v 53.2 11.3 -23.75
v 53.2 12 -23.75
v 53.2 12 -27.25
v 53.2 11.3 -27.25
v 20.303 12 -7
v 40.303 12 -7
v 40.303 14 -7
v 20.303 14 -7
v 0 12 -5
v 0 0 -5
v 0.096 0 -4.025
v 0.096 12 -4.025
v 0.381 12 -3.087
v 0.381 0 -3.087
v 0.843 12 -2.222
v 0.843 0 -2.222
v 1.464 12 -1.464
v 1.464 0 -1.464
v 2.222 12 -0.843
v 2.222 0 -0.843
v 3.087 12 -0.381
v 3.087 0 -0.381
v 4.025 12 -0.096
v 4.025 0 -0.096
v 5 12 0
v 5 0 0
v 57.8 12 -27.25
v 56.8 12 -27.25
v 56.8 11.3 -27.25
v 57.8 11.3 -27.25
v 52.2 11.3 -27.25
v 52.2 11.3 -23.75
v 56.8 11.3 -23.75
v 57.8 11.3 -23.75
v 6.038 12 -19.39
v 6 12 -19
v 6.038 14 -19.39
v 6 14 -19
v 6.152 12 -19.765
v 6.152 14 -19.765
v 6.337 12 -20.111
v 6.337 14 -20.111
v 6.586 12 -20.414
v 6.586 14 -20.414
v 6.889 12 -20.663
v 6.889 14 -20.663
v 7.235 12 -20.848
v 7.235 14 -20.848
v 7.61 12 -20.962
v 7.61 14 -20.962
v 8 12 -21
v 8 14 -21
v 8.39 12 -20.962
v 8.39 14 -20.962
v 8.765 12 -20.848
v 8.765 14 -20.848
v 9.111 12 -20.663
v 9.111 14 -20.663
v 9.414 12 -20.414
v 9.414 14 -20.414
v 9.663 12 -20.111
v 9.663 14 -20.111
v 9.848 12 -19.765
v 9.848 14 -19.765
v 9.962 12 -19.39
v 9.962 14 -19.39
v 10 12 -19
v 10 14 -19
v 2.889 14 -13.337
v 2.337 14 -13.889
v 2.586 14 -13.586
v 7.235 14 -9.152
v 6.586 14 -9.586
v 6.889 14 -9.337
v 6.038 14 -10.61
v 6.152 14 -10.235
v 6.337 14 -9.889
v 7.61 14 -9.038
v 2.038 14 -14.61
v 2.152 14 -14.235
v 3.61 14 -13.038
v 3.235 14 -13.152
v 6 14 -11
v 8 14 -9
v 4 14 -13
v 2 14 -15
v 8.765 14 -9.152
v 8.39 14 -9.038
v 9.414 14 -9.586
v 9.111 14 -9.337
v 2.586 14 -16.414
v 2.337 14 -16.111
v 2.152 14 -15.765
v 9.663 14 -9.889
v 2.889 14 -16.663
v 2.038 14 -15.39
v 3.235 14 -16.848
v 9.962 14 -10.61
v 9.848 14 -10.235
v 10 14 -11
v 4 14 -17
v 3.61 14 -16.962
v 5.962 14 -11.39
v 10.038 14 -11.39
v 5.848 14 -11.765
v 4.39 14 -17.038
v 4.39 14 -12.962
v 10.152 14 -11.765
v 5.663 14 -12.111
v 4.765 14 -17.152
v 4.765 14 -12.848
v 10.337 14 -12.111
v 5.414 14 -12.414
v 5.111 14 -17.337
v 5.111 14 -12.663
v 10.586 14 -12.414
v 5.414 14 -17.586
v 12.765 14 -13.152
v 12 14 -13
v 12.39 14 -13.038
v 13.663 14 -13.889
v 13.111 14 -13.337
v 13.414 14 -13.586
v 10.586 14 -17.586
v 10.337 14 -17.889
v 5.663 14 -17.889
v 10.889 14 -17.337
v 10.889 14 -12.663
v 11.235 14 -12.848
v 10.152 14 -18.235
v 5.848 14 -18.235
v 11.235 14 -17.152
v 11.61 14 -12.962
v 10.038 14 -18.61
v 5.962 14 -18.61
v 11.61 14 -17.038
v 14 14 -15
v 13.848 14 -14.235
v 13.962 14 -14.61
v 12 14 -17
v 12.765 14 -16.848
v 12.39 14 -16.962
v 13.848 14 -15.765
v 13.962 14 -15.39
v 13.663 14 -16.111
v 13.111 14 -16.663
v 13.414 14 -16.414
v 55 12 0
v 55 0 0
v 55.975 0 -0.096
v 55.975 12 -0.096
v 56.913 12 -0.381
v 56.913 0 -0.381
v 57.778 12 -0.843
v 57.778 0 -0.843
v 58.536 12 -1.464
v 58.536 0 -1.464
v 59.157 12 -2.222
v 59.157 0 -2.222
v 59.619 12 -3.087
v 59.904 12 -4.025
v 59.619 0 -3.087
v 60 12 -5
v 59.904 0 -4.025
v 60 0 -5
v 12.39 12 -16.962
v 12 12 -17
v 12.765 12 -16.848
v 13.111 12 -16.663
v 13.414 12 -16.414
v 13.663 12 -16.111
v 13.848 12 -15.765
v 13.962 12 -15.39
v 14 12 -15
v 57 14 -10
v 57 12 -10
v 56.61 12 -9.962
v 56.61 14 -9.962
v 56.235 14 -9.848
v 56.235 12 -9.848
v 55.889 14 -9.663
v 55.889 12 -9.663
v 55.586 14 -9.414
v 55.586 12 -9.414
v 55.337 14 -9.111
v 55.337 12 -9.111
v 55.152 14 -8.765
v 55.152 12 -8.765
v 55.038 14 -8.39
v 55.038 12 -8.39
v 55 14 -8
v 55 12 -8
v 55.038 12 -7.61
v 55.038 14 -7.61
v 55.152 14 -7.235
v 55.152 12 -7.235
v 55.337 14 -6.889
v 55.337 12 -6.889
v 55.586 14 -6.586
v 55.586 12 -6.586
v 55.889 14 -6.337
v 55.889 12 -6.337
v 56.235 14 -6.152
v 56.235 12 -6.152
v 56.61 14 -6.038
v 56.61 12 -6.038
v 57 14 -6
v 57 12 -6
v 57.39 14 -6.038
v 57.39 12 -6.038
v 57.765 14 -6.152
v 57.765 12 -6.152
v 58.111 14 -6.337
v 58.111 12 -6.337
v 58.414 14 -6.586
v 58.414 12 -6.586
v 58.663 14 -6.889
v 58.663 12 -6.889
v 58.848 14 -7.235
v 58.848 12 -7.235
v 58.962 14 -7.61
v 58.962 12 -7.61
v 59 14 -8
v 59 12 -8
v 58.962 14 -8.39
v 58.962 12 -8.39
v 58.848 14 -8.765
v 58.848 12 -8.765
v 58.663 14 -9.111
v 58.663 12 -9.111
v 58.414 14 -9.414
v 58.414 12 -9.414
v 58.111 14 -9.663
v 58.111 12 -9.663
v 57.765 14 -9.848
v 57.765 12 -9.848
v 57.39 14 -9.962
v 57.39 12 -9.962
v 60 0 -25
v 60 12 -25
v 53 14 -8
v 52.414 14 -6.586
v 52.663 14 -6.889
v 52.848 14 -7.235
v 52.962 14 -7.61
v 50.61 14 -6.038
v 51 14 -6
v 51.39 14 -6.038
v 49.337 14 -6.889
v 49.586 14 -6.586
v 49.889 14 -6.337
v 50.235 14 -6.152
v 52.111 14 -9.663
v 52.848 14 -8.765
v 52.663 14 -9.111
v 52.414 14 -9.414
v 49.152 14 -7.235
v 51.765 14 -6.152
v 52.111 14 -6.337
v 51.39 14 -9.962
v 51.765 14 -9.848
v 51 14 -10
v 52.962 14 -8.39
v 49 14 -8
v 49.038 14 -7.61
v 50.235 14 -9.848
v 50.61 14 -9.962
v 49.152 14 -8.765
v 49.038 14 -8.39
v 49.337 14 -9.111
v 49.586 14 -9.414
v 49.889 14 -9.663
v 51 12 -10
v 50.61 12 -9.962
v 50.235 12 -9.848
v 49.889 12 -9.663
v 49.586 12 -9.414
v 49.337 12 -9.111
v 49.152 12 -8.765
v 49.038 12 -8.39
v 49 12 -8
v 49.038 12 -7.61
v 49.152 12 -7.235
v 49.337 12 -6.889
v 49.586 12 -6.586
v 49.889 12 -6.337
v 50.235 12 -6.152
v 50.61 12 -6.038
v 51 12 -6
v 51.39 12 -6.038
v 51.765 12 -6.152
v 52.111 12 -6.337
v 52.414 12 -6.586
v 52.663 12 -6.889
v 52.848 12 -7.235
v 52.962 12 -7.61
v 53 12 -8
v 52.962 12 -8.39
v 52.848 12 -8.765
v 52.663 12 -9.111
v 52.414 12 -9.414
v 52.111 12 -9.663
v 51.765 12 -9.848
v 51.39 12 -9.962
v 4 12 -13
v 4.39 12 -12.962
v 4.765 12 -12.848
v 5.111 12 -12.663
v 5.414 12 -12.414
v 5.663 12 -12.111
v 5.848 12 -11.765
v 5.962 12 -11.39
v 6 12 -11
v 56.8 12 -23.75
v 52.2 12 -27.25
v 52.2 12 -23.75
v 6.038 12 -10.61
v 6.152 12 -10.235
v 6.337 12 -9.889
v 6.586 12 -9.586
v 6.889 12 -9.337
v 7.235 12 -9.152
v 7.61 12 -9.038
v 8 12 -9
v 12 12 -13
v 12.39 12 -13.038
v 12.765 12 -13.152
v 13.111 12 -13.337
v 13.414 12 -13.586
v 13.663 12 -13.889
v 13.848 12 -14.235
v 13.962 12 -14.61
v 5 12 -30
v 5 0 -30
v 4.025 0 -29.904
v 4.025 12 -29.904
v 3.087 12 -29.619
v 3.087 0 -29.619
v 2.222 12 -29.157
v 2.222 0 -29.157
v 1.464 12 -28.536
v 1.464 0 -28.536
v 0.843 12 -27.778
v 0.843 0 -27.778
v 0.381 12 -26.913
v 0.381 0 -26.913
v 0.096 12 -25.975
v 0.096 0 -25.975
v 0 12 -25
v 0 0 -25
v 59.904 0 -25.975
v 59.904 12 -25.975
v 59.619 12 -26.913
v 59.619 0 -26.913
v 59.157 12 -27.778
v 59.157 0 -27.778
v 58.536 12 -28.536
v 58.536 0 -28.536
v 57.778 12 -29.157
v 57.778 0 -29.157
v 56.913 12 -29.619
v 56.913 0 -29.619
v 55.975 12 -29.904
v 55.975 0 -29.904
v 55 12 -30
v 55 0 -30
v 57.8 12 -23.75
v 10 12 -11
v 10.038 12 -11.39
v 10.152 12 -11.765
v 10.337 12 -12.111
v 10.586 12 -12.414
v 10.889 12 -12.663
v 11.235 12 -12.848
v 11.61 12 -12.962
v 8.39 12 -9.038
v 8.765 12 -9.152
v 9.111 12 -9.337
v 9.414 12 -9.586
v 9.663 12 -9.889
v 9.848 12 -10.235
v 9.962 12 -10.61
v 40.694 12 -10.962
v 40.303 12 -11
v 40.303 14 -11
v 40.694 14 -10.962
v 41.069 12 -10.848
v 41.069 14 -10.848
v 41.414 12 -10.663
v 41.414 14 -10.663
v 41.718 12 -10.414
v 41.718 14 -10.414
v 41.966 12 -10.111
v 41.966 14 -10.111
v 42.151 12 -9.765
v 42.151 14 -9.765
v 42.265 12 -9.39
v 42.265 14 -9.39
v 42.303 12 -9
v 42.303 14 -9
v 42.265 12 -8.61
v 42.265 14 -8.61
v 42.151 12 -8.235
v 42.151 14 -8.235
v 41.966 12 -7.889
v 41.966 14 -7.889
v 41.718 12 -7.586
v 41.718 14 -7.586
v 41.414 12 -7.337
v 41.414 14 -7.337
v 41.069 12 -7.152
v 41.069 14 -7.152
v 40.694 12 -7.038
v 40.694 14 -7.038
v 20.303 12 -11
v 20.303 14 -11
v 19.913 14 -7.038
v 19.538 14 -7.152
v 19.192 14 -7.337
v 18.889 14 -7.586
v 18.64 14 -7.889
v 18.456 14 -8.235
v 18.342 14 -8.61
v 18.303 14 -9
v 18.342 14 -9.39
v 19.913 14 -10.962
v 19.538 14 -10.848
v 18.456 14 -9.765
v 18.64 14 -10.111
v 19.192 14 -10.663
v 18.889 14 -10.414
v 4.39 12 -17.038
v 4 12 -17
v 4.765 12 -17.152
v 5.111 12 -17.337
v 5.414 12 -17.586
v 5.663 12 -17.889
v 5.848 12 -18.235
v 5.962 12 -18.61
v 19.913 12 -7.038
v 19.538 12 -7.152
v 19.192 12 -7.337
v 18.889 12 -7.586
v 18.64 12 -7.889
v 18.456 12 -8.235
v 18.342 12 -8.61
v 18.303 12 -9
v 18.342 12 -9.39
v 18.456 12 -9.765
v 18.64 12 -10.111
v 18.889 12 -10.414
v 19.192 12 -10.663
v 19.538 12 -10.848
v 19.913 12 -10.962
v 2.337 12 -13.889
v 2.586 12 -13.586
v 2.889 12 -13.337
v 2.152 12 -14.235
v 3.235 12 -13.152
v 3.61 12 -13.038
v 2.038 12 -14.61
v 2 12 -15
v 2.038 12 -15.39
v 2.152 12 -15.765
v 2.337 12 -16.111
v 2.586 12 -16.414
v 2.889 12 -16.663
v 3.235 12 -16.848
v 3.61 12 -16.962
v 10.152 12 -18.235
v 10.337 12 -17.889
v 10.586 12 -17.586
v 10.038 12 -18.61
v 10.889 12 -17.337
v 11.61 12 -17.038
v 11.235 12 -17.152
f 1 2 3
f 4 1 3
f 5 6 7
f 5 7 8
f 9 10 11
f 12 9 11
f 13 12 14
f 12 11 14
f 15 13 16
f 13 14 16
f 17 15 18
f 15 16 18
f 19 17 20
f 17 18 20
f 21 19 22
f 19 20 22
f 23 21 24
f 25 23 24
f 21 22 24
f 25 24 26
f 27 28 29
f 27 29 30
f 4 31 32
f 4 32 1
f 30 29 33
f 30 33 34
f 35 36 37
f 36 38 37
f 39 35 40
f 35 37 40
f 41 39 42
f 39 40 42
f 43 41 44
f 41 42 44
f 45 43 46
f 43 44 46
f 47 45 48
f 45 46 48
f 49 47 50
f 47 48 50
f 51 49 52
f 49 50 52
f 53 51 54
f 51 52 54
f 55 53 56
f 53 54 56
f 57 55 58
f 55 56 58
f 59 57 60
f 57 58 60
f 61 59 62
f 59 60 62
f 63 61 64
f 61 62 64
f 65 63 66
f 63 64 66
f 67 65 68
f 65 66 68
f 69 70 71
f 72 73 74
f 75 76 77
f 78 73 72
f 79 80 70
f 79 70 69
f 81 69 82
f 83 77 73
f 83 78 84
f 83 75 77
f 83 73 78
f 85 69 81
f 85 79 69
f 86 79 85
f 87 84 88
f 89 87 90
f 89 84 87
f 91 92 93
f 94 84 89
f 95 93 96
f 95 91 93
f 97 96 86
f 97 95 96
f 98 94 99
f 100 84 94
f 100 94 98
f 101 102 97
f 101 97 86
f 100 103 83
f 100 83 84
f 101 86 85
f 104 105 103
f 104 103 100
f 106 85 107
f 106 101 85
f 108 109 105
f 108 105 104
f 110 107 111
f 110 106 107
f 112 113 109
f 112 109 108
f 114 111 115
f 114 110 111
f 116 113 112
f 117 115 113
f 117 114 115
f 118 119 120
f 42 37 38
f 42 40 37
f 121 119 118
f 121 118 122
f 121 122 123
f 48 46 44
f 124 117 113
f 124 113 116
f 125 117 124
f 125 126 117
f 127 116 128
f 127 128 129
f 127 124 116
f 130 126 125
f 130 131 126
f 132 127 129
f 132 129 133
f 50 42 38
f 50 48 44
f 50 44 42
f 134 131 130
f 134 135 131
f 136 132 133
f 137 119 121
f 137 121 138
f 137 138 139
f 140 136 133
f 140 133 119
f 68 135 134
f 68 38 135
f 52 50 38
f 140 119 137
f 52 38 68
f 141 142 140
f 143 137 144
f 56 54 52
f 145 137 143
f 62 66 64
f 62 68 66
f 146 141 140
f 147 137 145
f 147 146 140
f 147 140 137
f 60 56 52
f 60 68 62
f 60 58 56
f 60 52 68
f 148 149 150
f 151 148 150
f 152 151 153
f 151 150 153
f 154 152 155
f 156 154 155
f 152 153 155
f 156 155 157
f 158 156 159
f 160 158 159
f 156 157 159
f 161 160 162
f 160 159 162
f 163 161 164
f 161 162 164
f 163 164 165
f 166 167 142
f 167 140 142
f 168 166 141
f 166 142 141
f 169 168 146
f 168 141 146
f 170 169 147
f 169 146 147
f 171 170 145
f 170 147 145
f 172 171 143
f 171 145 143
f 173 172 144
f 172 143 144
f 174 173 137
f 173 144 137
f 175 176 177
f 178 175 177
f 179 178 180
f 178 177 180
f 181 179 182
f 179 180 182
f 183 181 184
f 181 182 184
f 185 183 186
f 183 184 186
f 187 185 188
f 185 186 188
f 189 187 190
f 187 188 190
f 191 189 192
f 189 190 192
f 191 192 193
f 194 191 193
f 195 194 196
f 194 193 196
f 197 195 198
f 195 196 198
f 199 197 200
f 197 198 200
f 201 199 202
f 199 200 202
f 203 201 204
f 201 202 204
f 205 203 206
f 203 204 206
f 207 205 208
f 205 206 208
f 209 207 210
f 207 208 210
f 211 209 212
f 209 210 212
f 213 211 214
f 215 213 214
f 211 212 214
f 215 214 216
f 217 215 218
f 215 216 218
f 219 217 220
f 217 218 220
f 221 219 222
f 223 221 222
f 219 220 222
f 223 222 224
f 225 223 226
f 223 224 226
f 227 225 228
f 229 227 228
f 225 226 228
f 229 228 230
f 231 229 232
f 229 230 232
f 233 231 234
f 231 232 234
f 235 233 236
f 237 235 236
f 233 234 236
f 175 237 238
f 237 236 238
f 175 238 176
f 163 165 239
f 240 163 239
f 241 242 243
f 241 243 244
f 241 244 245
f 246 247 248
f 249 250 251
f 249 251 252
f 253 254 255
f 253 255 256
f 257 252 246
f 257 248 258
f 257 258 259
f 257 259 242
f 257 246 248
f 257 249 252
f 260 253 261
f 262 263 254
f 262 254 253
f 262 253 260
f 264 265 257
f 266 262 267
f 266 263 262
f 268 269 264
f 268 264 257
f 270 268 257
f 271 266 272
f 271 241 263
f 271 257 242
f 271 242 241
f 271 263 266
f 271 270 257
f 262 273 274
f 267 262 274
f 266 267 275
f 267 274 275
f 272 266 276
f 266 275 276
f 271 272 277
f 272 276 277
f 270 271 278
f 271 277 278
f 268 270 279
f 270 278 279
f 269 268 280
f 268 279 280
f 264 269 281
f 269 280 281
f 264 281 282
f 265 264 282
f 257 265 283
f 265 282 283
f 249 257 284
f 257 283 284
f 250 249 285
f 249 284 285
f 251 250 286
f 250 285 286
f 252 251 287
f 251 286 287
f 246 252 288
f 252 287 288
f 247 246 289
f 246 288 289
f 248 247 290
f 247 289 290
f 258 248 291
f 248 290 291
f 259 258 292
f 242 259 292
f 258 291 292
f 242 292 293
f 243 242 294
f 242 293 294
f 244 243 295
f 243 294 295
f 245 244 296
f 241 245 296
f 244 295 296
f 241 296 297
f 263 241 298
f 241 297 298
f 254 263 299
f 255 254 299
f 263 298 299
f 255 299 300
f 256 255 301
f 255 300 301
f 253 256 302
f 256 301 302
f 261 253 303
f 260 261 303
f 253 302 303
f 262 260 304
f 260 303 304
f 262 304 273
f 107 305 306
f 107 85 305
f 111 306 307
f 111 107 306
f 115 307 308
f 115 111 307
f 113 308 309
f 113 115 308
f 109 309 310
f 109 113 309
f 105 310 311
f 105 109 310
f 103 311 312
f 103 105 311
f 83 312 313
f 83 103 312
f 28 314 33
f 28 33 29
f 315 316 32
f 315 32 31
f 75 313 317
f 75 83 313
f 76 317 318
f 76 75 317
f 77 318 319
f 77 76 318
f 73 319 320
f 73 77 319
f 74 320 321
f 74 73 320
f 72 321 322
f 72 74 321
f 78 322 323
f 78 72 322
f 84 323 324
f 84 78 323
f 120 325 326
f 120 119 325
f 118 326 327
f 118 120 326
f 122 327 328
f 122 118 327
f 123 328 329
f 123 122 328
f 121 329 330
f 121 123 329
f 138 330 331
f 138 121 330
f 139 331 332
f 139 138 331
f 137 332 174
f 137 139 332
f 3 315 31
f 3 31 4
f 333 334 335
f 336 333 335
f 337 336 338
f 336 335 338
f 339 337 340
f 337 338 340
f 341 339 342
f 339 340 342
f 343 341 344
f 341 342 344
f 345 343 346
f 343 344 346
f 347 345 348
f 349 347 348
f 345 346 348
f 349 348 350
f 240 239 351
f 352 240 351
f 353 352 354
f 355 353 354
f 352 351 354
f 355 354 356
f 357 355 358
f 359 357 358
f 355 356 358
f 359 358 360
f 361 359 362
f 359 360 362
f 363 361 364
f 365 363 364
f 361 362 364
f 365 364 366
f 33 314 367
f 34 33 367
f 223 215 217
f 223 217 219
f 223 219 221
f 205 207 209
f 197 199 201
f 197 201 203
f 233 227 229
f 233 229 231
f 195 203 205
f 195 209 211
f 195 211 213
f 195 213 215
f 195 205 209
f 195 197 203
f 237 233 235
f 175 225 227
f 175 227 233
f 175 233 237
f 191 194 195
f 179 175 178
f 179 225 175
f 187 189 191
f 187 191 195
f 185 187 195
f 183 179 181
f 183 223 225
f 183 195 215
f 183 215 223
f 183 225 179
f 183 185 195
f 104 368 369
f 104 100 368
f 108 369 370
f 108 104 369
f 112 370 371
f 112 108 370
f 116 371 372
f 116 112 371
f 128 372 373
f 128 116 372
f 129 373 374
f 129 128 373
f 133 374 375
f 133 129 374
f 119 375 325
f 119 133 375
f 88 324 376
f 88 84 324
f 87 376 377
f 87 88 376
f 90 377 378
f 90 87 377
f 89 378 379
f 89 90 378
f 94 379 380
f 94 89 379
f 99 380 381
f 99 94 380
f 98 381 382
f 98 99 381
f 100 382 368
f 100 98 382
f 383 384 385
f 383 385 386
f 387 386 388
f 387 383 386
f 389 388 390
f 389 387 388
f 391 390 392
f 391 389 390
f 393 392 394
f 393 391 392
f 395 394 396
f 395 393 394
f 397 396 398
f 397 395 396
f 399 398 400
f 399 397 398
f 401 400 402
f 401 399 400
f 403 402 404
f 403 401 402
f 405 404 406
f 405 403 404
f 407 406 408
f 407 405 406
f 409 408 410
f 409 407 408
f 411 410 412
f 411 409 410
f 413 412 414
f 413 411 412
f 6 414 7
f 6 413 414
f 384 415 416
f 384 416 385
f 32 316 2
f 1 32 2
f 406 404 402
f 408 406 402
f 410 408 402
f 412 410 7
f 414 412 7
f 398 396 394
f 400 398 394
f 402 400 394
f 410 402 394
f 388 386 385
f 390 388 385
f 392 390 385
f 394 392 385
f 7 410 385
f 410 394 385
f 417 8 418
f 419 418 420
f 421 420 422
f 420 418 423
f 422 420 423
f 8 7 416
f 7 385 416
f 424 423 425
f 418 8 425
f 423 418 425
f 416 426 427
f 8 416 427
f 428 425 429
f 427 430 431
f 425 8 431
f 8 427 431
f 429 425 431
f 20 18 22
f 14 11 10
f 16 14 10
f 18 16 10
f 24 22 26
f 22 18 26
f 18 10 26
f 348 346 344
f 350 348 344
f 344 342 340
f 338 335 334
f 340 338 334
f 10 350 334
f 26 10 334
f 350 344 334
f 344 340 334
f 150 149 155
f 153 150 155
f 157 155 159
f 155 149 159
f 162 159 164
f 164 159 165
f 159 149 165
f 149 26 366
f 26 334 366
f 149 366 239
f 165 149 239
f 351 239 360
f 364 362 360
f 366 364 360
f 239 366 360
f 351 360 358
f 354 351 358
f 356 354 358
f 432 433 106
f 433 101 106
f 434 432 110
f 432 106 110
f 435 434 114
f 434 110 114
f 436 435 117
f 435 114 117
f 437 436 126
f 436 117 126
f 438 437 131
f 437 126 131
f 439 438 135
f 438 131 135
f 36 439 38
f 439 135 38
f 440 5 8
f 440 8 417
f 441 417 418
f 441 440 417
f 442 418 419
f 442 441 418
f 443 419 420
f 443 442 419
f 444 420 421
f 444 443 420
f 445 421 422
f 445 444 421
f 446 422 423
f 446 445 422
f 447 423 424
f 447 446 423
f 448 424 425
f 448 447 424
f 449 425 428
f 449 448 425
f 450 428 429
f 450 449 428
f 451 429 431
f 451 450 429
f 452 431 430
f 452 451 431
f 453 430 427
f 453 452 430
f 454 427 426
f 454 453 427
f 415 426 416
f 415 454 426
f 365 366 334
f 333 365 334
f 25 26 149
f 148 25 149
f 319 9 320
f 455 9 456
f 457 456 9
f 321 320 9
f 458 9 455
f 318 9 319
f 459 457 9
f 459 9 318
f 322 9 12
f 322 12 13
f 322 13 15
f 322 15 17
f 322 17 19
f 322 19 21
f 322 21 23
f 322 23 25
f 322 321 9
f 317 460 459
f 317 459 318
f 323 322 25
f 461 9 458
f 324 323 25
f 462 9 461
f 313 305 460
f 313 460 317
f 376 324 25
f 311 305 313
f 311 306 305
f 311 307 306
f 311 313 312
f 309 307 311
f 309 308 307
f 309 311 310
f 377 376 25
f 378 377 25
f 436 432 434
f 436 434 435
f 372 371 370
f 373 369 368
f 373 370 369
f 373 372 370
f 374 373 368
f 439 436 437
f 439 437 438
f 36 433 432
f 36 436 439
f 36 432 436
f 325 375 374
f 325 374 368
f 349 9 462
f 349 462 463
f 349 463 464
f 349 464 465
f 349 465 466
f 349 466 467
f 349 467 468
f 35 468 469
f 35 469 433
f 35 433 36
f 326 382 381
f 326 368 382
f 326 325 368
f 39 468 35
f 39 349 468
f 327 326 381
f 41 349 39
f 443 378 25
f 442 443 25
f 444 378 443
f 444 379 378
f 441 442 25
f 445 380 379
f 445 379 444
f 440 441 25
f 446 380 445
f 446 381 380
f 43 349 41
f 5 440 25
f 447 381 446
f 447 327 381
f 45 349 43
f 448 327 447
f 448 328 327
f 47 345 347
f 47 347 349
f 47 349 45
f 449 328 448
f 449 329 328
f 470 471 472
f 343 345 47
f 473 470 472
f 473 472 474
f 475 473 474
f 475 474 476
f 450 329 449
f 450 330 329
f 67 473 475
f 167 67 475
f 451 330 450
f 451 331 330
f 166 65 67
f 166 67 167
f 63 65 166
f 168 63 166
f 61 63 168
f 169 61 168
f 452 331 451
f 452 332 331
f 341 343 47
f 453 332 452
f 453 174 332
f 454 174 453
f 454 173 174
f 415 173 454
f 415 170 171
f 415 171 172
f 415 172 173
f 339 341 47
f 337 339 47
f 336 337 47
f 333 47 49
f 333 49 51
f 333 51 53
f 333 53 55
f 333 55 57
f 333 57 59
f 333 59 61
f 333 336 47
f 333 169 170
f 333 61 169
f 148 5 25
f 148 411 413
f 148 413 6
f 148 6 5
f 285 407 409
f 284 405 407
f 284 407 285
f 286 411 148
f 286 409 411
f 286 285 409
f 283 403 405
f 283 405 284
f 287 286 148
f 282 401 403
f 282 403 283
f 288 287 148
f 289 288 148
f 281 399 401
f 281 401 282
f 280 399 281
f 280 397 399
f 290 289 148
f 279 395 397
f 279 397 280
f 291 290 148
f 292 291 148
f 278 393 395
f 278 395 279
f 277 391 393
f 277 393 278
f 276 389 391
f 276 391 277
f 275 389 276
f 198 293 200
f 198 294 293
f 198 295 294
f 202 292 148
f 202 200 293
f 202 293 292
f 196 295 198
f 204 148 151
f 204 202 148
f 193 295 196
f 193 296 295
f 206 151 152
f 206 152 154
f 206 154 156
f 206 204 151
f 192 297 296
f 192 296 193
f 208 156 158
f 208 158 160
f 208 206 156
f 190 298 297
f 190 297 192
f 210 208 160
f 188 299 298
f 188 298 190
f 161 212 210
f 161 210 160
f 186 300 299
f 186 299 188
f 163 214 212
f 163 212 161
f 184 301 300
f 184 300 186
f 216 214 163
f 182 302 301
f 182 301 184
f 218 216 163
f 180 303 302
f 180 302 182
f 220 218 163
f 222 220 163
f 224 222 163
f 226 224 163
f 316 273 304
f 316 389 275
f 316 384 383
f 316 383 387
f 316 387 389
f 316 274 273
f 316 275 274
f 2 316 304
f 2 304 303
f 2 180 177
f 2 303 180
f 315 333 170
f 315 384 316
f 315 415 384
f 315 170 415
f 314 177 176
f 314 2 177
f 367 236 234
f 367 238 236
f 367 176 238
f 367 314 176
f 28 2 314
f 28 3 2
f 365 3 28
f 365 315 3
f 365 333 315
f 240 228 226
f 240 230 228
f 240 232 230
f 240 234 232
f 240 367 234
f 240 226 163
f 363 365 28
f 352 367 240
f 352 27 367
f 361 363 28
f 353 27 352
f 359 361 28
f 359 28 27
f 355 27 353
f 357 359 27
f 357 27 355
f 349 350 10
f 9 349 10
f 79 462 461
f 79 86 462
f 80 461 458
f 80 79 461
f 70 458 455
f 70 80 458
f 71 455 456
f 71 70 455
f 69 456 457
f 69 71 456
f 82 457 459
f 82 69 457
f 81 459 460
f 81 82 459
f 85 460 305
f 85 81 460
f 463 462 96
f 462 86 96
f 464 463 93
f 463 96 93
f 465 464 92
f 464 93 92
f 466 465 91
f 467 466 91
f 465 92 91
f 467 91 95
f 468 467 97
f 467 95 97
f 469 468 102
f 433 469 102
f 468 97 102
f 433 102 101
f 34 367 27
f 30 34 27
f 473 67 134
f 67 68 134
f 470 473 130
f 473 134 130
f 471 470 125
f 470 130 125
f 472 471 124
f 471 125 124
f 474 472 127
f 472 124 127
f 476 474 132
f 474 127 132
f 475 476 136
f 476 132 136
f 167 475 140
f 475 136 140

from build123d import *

# Parameters (mm, degrees)
BOSS_EXTRUDE1_DEPTH = 12
SKETCH2_R           = 2
BOSS_EXTRUDE2_DEPTH = 2
SKETCH3_W           = 1
SKETCH3_H           = 3.5
CUT_EXTRUDE1_DEPTH  = 0.7
FILLET2_R           = 2


with BuildPart() as part:
    # Sketch1 → Boss-Extrude1 (new body)
    with BuildSketch(Plane(origin=(0, 0, 0), x_dir=(1, 0, 0), z_dir=(0, 1, 0))):
        with BuildLine():
            Line((5, 0), (55, 0))
            ThreePointArc((55, 0), (58.535533906, 1.464466094), (60, 5))
            Line((60, 5), (60, 25))
            ThreePointArc((60, 25), (58.535533906, 28.535533906), (55, 30))
            Line((55, 30), (5, 30))
            ThreePointArc((5, 30), (1.464466094, 28.535533906), (0, 25))
            Line((0, 25), (0, 5))
            ThreePointArc((0, 5), (1.464466094, 1.464466094), (5, 0))
        make_face()
    extrude(amount=BOSS_EXTRUDE1_DEPTH)

    # Sketch2 → Boss-Extrude2 (add)
    with BuildSketch(Plane(origin=(0, 12, 0), x_dir=(1, 0, 0), z_dir=(0, 1, 0))):
        with Locations(Location((57, 8, 0), (0, 0, 90))):
            Circle(SKETCH2_R)
        with Locations(Location((51, 8, 0), (0, 0, 90))):
            Circle(SKETCH2_R)
        Polygon((2, 17), (2, 13), (6, 13), (6, 9), (10, 9), (10, 13), (14, 13), (14, 17), (10, 17), (10, 21), (6, 21), (6, 17), align=None)
        with BuildLine():
            Line((20.303338261, 11), (40.303338261, 11))
            ThreePointArc((40.303338261, 11), (42.303338261, 9), (40.303338261, 7))
            Line((40.303338261, 7), (20.303338261, 7))
            ThreePointArc((20.303338261, 7), (18.303338261, 9), (20.303338261, 11))
        make_face()
    extrude(amount=BOSS_EXTRUDE2_DEPTH)

    # Sketch3 → Cut-Extrude1 (cut)
    with BuildSketch(Plane(origin=(0, 12, 0), x_dir=(1, 0, 0), z_dir=(0, 1, 0))):
        with Locations((52.7, 25.5)):
            Rectangle(SKETCH3_W, SKETCH3_H)
        with Locations((57.3, 25.5)):
            Rectangle(SKETCH3_W, SKETCH3_H)
    extrude(amount=-CUT_EXTRUDE1_DEPTH, mode=Mode.SUBTRACT)

    # Fillet2
    fillet2_edges = [part.edges().sort_by_distance(p)[0] for p in [
        (6, 13, -9),
        (6, 13, -13),
        (2, 13, -13),
        (2, 13, -17),
        (6, 13, -17),
        (6, 13, -21),
        (10, 13, -21),
        (10, 13, -17),
        (14, 13, -17),
        (14, 13, -13),
        (10, 13, -13),
        (10, 13, -9),
    ]]
    fillet(fillet2_edges, radius=FILLET2_R - 0.0001)  # a hair under: the kernel refuses the full size


solid = part.part
